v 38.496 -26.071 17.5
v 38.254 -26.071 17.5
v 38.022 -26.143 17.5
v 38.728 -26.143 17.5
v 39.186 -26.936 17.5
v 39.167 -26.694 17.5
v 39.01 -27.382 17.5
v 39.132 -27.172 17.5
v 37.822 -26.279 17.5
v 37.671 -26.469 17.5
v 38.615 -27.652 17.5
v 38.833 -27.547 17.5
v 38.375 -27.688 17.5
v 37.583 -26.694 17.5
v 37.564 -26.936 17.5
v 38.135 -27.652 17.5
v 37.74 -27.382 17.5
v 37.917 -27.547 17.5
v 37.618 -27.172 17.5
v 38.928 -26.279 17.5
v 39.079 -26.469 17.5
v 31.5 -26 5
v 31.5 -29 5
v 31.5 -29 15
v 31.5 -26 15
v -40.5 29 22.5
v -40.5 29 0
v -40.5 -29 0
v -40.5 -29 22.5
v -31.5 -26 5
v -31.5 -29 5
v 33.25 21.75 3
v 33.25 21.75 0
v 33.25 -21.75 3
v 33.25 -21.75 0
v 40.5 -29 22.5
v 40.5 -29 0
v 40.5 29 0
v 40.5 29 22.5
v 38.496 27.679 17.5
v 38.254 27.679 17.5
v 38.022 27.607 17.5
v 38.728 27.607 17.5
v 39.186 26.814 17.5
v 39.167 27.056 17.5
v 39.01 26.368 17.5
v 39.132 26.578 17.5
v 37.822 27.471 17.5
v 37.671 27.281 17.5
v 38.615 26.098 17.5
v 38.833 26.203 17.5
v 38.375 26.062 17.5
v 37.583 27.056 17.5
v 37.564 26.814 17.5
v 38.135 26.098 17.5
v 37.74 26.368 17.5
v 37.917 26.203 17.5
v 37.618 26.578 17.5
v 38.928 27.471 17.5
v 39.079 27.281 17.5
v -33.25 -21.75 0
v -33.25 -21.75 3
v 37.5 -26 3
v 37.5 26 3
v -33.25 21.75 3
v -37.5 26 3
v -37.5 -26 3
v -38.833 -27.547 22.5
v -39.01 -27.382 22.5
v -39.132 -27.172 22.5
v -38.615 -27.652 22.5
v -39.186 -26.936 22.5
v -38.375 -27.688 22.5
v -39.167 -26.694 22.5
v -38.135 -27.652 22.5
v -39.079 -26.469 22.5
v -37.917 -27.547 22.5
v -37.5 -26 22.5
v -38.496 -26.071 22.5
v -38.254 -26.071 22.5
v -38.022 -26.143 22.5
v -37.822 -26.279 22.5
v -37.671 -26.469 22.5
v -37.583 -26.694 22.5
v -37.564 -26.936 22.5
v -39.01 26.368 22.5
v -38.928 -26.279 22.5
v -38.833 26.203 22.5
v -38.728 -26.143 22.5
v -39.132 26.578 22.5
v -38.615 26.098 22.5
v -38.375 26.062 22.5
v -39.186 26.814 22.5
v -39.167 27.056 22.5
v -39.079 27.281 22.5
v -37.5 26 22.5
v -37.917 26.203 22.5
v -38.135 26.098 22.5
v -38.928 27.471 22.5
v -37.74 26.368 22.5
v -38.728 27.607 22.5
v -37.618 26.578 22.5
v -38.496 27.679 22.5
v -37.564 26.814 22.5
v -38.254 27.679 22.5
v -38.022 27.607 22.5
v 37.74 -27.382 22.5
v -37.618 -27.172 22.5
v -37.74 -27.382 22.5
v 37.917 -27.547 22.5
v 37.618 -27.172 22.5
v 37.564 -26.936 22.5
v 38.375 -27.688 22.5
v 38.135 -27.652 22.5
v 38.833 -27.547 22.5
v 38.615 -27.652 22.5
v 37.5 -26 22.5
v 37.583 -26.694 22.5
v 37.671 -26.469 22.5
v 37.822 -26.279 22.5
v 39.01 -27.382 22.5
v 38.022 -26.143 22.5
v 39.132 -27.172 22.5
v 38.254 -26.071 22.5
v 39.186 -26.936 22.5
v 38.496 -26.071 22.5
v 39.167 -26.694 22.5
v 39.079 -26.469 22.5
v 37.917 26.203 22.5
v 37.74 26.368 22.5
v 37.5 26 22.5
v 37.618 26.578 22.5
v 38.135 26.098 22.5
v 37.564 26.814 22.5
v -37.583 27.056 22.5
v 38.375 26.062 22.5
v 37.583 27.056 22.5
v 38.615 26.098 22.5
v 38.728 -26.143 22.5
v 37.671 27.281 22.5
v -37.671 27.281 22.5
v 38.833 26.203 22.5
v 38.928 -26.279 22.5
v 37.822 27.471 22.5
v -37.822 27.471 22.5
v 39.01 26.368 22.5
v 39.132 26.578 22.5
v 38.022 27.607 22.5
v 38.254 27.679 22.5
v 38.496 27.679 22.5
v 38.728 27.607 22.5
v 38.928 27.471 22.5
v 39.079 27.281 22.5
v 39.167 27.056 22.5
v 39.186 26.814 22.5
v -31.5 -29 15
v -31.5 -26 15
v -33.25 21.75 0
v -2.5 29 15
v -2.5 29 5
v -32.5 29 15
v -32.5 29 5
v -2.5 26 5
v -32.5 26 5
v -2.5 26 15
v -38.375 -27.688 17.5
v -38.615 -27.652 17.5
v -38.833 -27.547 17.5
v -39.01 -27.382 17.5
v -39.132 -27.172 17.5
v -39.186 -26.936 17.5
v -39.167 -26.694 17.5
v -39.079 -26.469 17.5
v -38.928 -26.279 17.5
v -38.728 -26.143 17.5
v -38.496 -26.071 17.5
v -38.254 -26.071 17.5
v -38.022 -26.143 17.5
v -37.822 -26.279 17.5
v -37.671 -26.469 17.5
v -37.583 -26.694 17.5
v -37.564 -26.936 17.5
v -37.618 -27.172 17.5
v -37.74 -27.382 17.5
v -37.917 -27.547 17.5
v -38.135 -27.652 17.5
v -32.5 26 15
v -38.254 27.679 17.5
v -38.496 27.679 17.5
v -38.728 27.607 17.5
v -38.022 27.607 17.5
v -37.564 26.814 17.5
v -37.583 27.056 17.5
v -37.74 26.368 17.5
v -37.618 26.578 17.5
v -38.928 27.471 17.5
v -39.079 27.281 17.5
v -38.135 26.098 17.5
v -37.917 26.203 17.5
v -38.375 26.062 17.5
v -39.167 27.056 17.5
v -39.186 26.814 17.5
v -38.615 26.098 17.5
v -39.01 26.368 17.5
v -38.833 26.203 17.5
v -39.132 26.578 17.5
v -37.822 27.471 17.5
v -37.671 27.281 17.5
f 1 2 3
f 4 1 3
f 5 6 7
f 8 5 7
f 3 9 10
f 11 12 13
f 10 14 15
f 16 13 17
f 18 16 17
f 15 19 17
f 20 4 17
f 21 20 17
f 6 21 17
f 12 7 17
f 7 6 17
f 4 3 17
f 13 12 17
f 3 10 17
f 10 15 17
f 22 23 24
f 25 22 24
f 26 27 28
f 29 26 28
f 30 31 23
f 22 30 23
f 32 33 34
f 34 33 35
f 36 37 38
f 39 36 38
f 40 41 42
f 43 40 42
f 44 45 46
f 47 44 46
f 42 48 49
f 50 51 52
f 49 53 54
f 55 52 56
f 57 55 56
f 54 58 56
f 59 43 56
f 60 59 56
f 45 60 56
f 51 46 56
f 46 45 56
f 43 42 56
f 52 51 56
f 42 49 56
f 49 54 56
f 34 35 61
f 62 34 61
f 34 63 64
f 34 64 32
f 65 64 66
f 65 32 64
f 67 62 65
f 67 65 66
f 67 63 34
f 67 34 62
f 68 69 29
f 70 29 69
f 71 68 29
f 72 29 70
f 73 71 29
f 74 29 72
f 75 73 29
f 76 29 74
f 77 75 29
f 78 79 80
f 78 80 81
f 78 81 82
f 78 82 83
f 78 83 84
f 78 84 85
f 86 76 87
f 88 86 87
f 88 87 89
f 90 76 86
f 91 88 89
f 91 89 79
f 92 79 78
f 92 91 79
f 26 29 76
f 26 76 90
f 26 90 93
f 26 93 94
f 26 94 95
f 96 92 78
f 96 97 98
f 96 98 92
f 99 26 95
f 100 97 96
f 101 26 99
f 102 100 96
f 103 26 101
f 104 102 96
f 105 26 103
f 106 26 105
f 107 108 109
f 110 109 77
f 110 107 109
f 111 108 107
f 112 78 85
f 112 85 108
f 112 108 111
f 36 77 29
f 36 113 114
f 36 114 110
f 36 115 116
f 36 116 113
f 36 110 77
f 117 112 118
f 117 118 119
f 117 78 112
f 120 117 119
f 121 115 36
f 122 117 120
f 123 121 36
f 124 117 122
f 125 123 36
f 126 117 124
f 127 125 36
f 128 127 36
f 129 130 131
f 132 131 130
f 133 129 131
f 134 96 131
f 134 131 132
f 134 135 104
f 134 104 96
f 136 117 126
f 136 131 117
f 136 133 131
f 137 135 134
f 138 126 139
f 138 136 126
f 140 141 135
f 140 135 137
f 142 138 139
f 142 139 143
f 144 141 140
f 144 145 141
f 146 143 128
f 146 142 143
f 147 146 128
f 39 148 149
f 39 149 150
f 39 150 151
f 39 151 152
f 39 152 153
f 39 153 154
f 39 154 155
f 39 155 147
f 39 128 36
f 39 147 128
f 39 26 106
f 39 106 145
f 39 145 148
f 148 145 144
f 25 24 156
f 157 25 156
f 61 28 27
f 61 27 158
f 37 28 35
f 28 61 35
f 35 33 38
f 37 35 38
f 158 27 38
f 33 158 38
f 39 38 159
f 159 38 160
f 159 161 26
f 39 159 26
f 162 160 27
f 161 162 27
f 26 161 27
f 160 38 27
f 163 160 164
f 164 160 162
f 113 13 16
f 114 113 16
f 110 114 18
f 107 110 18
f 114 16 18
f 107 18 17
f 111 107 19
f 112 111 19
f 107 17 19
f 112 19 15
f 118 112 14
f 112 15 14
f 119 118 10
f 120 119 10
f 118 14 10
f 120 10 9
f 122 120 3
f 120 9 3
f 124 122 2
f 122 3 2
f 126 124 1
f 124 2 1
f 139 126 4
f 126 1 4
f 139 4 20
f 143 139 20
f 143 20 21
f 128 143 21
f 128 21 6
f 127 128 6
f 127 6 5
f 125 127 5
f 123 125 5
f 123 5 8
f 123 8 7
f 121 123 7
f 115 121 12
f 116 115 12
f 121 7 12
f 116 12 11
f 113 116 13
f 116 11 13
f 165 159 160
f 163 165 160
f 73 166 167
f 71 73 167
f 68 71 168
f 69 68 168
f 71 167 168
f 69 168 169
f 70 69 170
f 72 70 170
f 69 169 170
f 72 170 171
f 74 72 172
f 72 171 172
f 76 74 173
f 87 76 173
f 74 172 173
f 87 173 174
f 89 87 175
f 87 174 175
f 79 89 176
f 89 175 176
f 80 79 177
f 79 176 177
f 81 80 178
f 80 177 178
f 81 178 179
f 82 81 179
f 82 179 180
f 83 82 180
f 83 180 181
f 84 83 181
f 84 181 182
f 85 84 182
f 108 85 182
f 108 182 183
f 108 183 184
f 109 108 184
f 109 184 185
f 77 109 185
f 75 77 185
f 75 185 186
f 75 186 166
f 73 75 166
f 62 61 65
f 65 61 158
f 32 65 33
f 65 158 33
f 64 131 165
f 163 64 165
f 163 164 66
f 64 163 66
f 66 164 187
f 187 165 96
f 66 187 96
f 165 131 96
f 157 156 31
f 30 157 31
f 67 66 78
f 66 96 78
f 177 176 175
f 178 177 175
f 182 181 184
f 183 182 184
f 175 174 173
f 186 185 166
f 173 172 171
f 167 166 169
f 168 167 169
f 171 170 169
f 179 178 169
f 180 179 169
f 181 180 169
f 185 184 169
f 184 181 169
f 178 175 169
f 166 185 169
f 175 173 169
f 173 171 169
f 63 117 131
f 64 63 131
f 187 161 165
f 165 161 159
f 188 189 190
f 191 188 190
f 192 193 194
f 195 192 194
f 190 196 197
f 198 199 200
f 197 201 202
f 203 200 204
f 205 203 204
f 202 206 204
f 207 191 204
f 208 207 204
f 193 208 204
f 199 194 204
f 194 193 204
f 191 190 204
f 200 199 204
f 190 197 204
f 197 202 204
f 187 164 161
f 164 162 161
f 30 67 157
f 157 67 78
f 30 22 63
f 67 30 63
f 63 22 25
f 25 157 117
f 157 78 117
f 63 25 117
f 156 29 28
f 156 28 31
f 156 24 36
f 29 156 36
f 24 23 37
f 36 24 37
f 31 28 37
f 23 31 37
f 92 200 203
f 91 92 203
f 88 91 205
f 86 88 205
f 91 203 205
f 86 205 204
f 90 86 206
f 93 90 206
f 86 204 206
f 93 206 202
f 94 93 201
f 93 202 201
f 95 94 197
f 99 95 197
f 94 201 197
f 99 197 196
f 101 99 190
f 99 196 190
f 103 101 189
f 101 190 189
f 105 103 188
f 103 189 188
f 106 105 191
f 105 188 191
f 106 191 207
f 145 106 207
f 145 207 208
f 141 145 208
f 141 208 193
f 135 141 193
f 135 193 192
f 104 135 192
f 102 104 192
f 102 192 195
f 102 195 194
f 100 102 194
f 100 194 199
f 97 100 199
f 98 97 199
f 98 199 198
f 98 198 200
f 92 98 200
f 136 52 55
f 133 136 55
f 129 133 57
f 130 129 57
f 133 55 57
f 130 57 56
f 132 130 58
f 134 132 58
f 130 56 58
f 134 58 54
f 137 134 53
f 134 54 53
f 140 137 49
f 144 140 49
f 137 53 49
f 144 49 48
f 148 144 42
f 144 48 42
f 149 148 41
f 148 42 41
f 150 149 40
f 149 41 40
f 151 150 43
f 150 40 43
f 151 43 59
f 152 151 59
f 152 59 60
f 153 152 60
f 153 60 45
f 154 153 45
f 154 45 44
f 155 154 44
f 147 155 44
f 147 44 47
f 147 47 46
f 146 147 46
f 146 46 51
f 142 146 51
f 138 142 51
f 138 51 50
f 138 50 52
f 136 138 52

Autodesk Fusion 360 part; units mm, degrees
sketch "Sketch1" plane through (0, 0, 0) normal (0, 0, 1) x (1, 0, 0)
  line L0 (40.5, 29) -> (-40.5, 29)
  line L1 (-40.5, 29) -> (-40.5, -29)
  line L2 (-40.5, -29) -> (40.5, -29)
  line L3 (40.5, -29) -> (40.5, 29)
  line L4 (40.5, 29) -> (-40.5, -29) construction
  line L5 (-40.5, 29) -> (40.5, -29) construction
  dimension "d1" = 81
  dimension "d2" = 58
extrude "Extrude1" add sketch "Sketch1" along normal blind 22.5
sketch "Sketch2" plane through (0, 0, 22.5) normal (0, 0, 1) x (-1, 0, 0)
  line L0 (-40.5, 29) -> (-40.5, -29)
  line L1 (-40.5, -29) -> (40.5, -29)
  line L2 (40.5, -29) -> (40.5, 29)
  line L3 (40.5, 29) -> (-40.5, 29)
  line L4 (-37.5, -26) -> (37.5, -26)
  line L5 (37.5, -26) -> (37.5, 26)
  line L6 (37.5, 26) -> (-37.5, 26)
  line L7 (-37.5, 26) -> (-37.5, -26)
  line L8 (-37.5, -26) -> (37.5, 26) construction
  line L9 (37.5, -26) -> (-37.5, 26) construction
  dimension "d5" = 75
  dimension "d6" = 52
extrude "Extrude2" cut sketch "Sketch2" against normal blind 19.5 contours L4 L5 L6 L7
sketch "Sketch3" plane through (0, 0, 0) normal (0, 0, -1) x (1, 0, 0)
  line L0 (40.5, -29) -> (40.5, 29)
  line L1 (40.5, 29) -> (-40.5, 29)
  line L2 (-40.5, 29) -> (-40.5, -29)
  line L3 (-40.5, -29) -> (40.5, -29)
  line L4 (33.25, 21.75) -> (-33.25, 21.75)
  line L5 (-33.25, 21.75) -> (-33.25, -21.75)
  line L6 (-33.25, -21.75) -> (33.25, -21.75)
  line L7 (33.25, -21.75) -> (33.25, 21.75)
  line L8 (33.25, 21.75) -> (-33.25, -21.75) construction
  line L9 (-33.25, 21.75) -> (33.25, -21.75) construction
  dimension "d9" = 66.5
  dimension "d10" = 43.5
sketch "Sketch4" plane through (0, 0, 0) normal (0, 0, -1) x (1, 0, 0)
extrude "Extrude3" cut sketch "Sketch3" against normal blind 3 contours L4 L5 L6 L7
sketch "Sketch5" plane through (0, 0, 3) normal (0, 0, 1) x (-1, 0, 0)
  line L0 (-33.25, 21.75) -> (33.25, 21.75)
  line L1 (33.25, 21.75) -> (33.25, -21.75)
  line L2 (33.25, -21.75) -> (-33.25, -21.75)
  line L3 (-33.25, -21.75) -> (-33.25, 21.75)
  line L4 (-37.5, 26) -> (-37.5, -26)
  line L5 (-37.5, -26) -> (37.5, -26)
  line L6 (37.5, -26) -> (37.5, 26)
  line L7 (37.5, 26) -> (-37.5, 26)
  circle A0 centre (35.875, -24.375) radius 1.5
  dimension "d13" = 3
  dimension "d14" = 1.625
  dimension "d15" = 1.625
sketch "Sketch6" plane through (0, 0, 3) normal (0, 0, 1) x (-1, 0, 0)
  circle A0 centre (-35.875, -24.375) radius 1.5
  line L0 (-37.5, -26) -> (37.5, -26)
  line L1 (-37.5, 26) -> (-37.5, -26)
  circle A1 centre (-35.875, 24.375) radius 1.5
  line L2 (37.5, 26) -> (-37.5, 26)
  circle A2 centre (35.875, 24.375) radius 1.5
  line L3 (37.5, -26) -> (37.5, 26)
  dimension "d16" = 3
  dimension "d17" = 1.625
  dimension "d18" = 1.625
  dimension "d19" = 3
  dimension "d20" = 1.625
  dimension "d21" = 1.625
  dimension "d25" = 3
  dimension "d26" = 1.625
  dimension "d27" = 1.625
sketch "Sketch8" plane through (0, -29, 0) normal (0, -1, 0) x (1, 0, 0)
  line L0 (-40.5, 0) -> (40.5, 0)
  line L1 (40.5, 0) -> (40.5, 22.5)
  line L2 (40.5, 22.5) -> (-40.5, 22.5)
  line L3 (-40.5, 22.5) -> (-40.5, 0)
  line L4 (31.5, 15) -> (-31.5, 15)
  line L5 (-31.5, 15) -> (-31.5, 5)
  line L6 (-31.5, 5) -> (31.5, 5)
  line L7 (31.5, 5) -> (31.5, 15)
  line L8 (31.5, 15) -> (-31.5, 5) construction
  line L9 (-31.5, 15) -> (31.5, 5) construction
  point P0 (0, 10)
  dimension "d30" = 63
  dimension "d31" = 10
  dimension "d33" = 15
extrude "Extrude5" cut sketch "Sketch8" against normal blind 3 contours L4 L5 L6 L7
sketch "Sketch9" plane through (0, 29, 0) normal (0, 1, 0) x (-1, 0, 0)
  line L0 (-40.5, 0) -> (40.5, 0)
  line L1 (40.5, 0) -> (40.5, 22.5)
  line L2 (40.5, 22.5) -> (-40.5, 22.5)
  line L3 (-40.5, 22.5) -> (-40.5, 0)
  line L4 (32.5, 15) -> (2.5, 15)
  line L5 (2.5, 15) -> (2.5, 5)
  line L6 (2.5, 5) -> (32.5, 5)
  line L7 (32.5, 5) -> (32.5, 15)
  line L8 (32.5, 15) -> (2.5, 5) construction
  line L9 (2.5, 15) -> (32.5, 5) construction
  point P0 (17.5, 10)
  dimension "d36" = 30
  dimension "d37" = 10
  dimension "d38" = 8
  dimension "d39" = 15
extrude "Extrude6" cut sketch "Sketch9" against normal blind 3 contours L4 L5 L6 L7
sketch "Sketch11" plane through (0, 0, 22.5) normal (0, 0, 1) x (-1, 0, 0)
  line L0 (37.5, -26) -> (-37.5, -26)
  line L1 (-37.5, -26) -> (-37.5, 26)
  line L2 (-37.5, 26) -> (37.5, 26)
  line L3 (37.5, 26) -> (37.5, -26)
  line L4 (-40.5, 29) -> (-40.5, -29)
  line L5 (-40.5, -29) -> (40.5, -29)
  line L6 (40.5, -29) -> (40.5, 29)
  line L7 (40.5, 29) -> (-40.5, 29)
  circle A0 centre (38.375, -26.875) radius 1
  circle A1 centre (38.375, 26.875) radius 1
  circle A2 centre (-38.375, 26.875) radius 1
  circle A3 centre (-38.375, -26.875) radius 1
  dimension "d56" = 2
  dimension "d57" = 2
  dimension "d58" = 2
  dimension "d59" = 2
  dimension "d60" = 2.125
  dimension "d61" = 2.125
  dimension "d62" = 2.125
  dimension "d63" = 2.125
  dimension "d64" = 2.125
  dimension "d65" = 2.125
  dimension "d66" = 2.125
  dimension "d67" = 2.125
hole "Hole1" at (-38.375, 26.875, 22.5) at (38.375, 26.875, 22.5) at (38.375, -26.875, 22.5) at (-38.375, -26.875, 22.5) direction (0, 0, -1) diameter 1.6256 depth 5 tip angle 180
sketch "Sketch12" plane through (0, 0, 0) normal (0, 0, 1) x (1, 0, 0)
sketch "Sketch13" plane through (0, 0, 3) normal (0, 0, 1) x (-1, 0, 0)
  line L0 (-33.25, 21.75) -> (33.25, 21.75)
  line L1 (33.25, 21.75) -> (33.25, -21.75)
  line L2 (33.25, -21.75) -> (-33.25, -21.75)
  line L3 (-33.25, -21.75) -> (-33.25, 21.75)
  line L4 (-37.5, 26) -> (-37.5, -26)
  line L5 (-37.5, -26) -> (37.5, -26)
  line L6 (37.5, -26) -> (37.5, 26)
  line L7 (37.5, 26) -> (-37.5, 26)
  circle A0 centre (33, 21.5) radius 1.25
  dimension "d73" = 2.5
  dimension "d74" = 4.5
  dimension "d75" = 4.5
sketch "Sketch14" plane through (0, 0, 3) normal (0, 0, 1) x (-1, 0, 0)
